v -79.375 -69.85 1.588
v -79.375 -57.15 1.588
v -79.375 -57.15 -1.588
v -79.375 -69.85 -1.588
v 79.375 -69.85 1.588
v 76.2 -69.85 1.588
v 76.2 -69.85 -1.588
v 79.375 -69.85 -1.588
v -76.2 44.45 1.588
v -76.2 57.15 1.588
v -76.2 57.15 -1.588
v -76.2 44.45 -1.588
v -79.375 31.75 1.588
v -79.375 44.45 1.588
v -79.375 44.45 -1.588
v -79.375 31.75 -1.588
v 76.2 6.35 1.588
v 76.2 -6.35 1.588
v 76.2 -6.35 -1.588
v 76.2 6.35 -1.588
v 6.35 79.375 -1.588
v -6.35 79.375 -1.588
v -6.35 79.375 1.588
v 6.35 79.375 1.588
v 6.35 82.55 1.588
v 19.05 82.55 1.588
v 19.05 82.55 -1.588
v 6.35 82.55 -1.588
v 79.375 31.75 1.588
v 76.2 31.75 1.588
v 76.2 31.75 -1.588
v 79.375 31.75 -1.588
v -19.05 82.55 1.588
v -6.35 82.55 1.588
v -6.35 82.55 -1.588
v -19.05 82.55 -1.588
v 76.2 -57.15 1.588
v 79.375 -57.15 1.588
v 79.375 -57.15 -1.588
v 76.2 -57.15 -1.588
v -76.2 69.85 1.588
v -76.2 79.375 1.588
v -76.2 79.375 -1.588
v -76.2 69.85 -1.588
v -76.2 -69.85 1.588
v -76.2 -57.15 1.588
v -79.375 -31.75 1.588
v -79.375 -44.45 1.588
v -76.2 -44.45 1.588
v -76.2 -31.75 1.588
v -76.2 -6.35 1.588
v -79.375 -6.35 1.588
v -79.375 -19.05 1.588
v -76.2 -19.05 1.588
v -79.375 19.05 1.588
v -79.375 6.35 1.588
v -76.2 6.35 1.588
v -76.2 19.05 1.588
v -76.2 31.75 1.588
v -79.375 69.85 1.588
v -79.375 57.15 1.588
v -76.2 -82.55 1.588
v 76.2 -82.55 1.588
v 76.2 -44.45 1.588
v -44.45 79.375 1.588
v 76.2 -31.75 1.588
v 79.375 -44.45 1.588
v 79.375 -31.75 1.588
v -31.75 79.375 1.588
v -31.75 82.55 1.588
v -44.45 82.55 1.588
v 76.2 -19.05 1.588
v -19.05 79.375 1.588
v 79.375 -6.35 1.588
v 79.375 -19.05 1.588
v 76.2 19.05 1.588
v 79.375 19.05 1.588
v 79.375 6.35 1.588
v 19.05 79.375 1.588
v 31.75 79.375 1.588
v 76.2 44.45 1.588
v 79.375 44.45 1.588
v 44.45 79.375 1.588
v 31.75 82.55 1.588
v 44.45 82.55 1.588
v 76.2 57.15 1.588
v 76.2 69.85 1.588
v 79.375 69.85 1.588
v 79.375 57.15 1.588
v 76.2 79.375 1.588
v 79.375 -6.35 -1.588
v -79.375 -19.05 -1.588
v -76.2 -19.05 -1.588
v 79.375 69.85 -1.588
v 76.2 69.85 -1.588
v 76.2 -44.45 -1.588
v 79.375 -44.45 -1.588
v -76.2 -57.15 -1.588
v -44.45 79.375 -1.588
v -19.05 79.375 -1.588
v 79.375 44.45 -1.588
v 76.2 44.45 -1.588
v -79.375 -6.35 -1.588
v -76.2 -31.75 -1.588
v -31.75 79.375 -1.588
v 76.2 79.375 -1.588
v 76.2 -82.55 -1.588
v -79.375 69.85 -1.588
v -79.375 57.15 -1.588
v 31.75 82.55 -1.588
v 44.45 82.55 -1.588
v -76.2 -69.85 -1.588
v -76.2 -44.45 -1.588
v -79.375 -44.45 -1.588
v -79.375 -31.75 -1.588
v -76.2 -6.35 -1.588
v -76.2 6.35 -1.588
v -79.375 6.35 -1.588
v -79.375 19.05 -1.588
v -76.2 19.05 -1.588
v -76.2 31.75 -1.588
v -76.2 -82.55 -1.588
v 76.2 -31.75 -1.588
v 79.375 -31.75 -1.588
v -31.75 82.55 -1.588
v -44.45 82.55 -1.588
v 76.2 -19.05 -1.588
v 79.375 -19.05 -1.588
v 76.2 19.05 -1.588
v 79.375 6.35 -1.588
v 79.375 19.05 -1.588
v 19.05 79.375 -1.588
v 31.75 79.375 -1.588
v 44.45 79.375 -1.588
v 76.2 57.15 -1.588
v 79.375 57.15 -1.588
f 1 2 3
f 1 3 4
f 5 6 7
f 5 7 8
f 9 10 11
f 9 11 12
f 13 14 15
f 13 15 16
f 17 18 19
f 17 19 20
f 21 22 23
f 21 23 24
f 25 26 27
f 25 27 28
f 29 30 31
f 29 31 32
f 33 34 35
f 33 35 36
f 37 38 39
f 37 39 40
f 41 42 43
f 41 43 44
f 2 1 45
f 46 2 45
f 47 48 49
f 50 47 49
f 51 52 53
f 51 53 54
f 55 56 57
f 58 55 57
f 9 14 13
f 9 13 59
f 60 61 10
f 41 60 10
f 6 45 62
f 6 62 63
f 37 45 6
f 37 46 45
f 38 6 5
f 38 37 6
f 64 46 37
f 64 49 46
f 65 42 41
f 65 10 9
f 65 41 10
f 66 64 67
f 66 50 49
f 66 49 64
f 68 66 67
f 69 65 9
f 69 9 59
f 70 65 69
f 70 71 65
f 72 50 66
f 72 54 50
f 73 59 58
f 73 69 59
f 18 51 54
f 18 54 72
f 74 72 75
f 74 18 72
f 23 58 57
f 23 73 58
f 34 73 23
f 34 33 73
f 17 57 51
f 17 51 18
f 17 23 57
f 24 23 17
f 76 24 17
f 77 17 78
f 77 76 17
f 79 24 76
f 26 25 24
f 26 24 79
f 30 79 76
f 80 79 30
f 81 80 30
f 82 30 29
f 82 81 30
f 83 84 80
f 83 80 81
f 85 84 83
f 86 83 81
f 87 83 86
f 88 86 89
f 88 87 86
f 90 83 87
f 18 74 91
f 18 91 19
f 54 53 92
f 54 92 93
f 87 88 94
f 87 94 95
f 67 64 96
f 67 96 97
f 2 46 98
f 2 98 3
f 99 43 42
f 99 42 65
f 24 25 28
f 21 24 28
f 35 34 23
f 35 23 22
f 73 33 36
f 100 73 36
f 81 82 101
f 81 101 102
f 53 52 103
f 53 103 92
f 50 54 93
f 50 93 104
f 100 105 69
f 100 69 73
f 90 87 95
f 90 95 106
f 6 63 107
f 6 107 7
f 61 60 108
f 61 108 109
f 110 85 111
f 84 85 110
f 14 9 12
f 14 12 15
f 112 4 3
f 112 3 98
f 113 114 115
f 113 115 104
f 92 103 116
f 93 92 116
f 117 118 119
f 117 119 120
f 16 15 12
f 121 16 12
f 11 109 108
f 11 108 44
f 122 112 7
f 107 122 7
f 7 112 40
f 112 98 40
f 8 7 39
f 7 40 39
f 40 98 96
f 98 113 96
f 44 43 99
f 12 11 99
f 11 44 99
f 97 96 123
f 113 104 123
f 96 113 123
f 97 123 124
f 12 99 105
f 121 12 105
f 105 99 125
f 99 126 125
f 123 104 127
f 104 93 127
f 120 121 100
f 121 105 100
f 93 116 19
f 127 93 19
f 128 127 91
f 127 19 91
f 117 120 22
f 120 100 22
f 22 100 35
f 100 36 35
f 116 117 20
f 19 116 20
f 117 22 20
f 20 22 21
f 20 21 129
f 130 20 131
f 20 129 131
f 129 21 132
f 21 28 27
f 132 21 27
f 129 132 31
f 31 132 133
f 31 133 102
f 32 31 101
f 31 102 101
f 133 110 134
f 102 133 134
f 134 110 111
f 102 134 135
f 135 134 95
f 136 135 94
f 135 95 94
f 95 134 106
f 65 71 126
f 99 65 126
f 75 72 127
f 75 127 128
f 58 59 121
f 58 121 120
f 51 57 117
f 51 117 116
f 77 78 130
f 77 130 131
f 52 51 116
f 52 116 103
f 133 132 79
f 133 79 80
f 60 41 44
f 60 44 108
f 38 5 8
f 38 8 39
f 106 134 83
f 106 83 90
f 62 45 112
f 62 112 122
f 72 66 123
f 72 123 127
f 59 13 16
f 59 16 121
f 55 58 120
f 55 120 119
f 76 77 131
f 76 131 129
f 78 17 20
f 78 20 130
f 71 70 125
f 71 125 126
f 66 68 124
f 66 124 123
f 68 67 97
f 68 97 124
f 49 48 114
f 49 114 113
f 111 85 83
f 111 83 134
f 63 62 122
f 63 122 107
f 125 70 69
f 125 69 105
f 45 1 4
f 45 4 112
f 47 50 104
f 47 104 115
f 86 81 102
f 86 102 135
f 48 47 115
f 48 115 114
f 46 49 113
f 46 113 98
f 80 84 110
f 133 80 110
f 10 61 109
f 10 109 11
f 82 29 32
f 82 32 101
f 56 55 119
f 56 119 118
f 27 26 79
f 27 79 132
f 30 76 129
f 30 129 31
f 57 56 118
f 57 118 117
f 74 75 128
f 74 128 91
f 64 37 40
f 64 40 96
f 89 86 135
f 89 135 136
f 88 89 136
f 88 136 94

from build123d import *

# Parameters (mm, degrees)
BOSS_EXTRUDE1_DEPTH = 1.5875
SKETCH2_W           = 31.75
SKETCH2_H           = 3.175
SKETCH2_W_2         = 12.7
CUT_EXTRUDE1_DEPTH  = 3.175


with BuildPart() as part:
    # Sketch1 → Boss-Extrude1 (new, symmetric)
    with BuildSketch(Plane.XY):
        Polygon((-76.2, 82.55), (-76.2, 69.85), (-79.375, 69.85), (-79.375, 57.15), (-76.2, 57.15), (-76.2, 44.45), (-79.375, 44.45), (-79.375, 31.75), (-76.2, 31.75), (-76.2, 19.05), (-79.375, 19.05), (-79.375, 6.35), (-76.2, 6.35), (-76.2, -6.35), (-79.375, -6.35), (-79.375, -19.05), (-76.2, -19.05), (-76.2, -31.75), (-79.375, -31.75), (-79.375, -44.45), (-76.2, -44.45), (-76.2, -57.15), (-79.375, -57.15), (-79.375, -69.85), (-76.2, -69.85), (-76.2, -82.55), (76.2, -82.55), (76.2, -69.85), (79.375, -69.85), (79.375, -57.15), (76.2, -57.15), (76.2, -44.45), (79.375, -44.45), (79.375, -31.75), (76.2, -31.75), (76.2, -19.05), (79.375, -19.05), (79.375, -6.35), (76.2, -6.35), (76.2, 6.35), (79.375, 6.35), (79.375, 19.05), (76.2, 19.05), (76.2, 31.75), (79.375, 31.75), (79.375, 44.45), (76.2, 44.45), (76.2, 57.15), (79.375, 57.15), (79.375, 69.85), (76.2, 69.85), (76.2, 82.55), align=None)
    extrude(amount=BOSS_EXTRUDE1_DEPTH, both=True)

    # Sketch2 → Cut-Extrude1 (cut)
    with BuildSketch(Plane(origin=(0, 82.55, 0), x_dir=(1, 0, 0), z_dir=(0, 1, 0))):
        with Locations((60.325, 0)):
            Rectangle(SKETCH2_W, SKETCH2_H)
        with Locations((-60.325, 0)):
            Rectangle(SKETCH2_W, SKETCH2_H)
        with Locations((25.4, 0)):
            Rectangle(SKETCH2_W_2, SKETCH2_H)
        Rectangle(SKETCH2_W_2, SKETCH2_H)
        with Locations((-25.4, 0)):
            Rectangle(SKETCH2_W_2, SKETCH2_H)
    extrude(amount=-CUT_EXTRUDE1_DEPTH, mode=Mode.SUBTRACT)


solid = part.part
